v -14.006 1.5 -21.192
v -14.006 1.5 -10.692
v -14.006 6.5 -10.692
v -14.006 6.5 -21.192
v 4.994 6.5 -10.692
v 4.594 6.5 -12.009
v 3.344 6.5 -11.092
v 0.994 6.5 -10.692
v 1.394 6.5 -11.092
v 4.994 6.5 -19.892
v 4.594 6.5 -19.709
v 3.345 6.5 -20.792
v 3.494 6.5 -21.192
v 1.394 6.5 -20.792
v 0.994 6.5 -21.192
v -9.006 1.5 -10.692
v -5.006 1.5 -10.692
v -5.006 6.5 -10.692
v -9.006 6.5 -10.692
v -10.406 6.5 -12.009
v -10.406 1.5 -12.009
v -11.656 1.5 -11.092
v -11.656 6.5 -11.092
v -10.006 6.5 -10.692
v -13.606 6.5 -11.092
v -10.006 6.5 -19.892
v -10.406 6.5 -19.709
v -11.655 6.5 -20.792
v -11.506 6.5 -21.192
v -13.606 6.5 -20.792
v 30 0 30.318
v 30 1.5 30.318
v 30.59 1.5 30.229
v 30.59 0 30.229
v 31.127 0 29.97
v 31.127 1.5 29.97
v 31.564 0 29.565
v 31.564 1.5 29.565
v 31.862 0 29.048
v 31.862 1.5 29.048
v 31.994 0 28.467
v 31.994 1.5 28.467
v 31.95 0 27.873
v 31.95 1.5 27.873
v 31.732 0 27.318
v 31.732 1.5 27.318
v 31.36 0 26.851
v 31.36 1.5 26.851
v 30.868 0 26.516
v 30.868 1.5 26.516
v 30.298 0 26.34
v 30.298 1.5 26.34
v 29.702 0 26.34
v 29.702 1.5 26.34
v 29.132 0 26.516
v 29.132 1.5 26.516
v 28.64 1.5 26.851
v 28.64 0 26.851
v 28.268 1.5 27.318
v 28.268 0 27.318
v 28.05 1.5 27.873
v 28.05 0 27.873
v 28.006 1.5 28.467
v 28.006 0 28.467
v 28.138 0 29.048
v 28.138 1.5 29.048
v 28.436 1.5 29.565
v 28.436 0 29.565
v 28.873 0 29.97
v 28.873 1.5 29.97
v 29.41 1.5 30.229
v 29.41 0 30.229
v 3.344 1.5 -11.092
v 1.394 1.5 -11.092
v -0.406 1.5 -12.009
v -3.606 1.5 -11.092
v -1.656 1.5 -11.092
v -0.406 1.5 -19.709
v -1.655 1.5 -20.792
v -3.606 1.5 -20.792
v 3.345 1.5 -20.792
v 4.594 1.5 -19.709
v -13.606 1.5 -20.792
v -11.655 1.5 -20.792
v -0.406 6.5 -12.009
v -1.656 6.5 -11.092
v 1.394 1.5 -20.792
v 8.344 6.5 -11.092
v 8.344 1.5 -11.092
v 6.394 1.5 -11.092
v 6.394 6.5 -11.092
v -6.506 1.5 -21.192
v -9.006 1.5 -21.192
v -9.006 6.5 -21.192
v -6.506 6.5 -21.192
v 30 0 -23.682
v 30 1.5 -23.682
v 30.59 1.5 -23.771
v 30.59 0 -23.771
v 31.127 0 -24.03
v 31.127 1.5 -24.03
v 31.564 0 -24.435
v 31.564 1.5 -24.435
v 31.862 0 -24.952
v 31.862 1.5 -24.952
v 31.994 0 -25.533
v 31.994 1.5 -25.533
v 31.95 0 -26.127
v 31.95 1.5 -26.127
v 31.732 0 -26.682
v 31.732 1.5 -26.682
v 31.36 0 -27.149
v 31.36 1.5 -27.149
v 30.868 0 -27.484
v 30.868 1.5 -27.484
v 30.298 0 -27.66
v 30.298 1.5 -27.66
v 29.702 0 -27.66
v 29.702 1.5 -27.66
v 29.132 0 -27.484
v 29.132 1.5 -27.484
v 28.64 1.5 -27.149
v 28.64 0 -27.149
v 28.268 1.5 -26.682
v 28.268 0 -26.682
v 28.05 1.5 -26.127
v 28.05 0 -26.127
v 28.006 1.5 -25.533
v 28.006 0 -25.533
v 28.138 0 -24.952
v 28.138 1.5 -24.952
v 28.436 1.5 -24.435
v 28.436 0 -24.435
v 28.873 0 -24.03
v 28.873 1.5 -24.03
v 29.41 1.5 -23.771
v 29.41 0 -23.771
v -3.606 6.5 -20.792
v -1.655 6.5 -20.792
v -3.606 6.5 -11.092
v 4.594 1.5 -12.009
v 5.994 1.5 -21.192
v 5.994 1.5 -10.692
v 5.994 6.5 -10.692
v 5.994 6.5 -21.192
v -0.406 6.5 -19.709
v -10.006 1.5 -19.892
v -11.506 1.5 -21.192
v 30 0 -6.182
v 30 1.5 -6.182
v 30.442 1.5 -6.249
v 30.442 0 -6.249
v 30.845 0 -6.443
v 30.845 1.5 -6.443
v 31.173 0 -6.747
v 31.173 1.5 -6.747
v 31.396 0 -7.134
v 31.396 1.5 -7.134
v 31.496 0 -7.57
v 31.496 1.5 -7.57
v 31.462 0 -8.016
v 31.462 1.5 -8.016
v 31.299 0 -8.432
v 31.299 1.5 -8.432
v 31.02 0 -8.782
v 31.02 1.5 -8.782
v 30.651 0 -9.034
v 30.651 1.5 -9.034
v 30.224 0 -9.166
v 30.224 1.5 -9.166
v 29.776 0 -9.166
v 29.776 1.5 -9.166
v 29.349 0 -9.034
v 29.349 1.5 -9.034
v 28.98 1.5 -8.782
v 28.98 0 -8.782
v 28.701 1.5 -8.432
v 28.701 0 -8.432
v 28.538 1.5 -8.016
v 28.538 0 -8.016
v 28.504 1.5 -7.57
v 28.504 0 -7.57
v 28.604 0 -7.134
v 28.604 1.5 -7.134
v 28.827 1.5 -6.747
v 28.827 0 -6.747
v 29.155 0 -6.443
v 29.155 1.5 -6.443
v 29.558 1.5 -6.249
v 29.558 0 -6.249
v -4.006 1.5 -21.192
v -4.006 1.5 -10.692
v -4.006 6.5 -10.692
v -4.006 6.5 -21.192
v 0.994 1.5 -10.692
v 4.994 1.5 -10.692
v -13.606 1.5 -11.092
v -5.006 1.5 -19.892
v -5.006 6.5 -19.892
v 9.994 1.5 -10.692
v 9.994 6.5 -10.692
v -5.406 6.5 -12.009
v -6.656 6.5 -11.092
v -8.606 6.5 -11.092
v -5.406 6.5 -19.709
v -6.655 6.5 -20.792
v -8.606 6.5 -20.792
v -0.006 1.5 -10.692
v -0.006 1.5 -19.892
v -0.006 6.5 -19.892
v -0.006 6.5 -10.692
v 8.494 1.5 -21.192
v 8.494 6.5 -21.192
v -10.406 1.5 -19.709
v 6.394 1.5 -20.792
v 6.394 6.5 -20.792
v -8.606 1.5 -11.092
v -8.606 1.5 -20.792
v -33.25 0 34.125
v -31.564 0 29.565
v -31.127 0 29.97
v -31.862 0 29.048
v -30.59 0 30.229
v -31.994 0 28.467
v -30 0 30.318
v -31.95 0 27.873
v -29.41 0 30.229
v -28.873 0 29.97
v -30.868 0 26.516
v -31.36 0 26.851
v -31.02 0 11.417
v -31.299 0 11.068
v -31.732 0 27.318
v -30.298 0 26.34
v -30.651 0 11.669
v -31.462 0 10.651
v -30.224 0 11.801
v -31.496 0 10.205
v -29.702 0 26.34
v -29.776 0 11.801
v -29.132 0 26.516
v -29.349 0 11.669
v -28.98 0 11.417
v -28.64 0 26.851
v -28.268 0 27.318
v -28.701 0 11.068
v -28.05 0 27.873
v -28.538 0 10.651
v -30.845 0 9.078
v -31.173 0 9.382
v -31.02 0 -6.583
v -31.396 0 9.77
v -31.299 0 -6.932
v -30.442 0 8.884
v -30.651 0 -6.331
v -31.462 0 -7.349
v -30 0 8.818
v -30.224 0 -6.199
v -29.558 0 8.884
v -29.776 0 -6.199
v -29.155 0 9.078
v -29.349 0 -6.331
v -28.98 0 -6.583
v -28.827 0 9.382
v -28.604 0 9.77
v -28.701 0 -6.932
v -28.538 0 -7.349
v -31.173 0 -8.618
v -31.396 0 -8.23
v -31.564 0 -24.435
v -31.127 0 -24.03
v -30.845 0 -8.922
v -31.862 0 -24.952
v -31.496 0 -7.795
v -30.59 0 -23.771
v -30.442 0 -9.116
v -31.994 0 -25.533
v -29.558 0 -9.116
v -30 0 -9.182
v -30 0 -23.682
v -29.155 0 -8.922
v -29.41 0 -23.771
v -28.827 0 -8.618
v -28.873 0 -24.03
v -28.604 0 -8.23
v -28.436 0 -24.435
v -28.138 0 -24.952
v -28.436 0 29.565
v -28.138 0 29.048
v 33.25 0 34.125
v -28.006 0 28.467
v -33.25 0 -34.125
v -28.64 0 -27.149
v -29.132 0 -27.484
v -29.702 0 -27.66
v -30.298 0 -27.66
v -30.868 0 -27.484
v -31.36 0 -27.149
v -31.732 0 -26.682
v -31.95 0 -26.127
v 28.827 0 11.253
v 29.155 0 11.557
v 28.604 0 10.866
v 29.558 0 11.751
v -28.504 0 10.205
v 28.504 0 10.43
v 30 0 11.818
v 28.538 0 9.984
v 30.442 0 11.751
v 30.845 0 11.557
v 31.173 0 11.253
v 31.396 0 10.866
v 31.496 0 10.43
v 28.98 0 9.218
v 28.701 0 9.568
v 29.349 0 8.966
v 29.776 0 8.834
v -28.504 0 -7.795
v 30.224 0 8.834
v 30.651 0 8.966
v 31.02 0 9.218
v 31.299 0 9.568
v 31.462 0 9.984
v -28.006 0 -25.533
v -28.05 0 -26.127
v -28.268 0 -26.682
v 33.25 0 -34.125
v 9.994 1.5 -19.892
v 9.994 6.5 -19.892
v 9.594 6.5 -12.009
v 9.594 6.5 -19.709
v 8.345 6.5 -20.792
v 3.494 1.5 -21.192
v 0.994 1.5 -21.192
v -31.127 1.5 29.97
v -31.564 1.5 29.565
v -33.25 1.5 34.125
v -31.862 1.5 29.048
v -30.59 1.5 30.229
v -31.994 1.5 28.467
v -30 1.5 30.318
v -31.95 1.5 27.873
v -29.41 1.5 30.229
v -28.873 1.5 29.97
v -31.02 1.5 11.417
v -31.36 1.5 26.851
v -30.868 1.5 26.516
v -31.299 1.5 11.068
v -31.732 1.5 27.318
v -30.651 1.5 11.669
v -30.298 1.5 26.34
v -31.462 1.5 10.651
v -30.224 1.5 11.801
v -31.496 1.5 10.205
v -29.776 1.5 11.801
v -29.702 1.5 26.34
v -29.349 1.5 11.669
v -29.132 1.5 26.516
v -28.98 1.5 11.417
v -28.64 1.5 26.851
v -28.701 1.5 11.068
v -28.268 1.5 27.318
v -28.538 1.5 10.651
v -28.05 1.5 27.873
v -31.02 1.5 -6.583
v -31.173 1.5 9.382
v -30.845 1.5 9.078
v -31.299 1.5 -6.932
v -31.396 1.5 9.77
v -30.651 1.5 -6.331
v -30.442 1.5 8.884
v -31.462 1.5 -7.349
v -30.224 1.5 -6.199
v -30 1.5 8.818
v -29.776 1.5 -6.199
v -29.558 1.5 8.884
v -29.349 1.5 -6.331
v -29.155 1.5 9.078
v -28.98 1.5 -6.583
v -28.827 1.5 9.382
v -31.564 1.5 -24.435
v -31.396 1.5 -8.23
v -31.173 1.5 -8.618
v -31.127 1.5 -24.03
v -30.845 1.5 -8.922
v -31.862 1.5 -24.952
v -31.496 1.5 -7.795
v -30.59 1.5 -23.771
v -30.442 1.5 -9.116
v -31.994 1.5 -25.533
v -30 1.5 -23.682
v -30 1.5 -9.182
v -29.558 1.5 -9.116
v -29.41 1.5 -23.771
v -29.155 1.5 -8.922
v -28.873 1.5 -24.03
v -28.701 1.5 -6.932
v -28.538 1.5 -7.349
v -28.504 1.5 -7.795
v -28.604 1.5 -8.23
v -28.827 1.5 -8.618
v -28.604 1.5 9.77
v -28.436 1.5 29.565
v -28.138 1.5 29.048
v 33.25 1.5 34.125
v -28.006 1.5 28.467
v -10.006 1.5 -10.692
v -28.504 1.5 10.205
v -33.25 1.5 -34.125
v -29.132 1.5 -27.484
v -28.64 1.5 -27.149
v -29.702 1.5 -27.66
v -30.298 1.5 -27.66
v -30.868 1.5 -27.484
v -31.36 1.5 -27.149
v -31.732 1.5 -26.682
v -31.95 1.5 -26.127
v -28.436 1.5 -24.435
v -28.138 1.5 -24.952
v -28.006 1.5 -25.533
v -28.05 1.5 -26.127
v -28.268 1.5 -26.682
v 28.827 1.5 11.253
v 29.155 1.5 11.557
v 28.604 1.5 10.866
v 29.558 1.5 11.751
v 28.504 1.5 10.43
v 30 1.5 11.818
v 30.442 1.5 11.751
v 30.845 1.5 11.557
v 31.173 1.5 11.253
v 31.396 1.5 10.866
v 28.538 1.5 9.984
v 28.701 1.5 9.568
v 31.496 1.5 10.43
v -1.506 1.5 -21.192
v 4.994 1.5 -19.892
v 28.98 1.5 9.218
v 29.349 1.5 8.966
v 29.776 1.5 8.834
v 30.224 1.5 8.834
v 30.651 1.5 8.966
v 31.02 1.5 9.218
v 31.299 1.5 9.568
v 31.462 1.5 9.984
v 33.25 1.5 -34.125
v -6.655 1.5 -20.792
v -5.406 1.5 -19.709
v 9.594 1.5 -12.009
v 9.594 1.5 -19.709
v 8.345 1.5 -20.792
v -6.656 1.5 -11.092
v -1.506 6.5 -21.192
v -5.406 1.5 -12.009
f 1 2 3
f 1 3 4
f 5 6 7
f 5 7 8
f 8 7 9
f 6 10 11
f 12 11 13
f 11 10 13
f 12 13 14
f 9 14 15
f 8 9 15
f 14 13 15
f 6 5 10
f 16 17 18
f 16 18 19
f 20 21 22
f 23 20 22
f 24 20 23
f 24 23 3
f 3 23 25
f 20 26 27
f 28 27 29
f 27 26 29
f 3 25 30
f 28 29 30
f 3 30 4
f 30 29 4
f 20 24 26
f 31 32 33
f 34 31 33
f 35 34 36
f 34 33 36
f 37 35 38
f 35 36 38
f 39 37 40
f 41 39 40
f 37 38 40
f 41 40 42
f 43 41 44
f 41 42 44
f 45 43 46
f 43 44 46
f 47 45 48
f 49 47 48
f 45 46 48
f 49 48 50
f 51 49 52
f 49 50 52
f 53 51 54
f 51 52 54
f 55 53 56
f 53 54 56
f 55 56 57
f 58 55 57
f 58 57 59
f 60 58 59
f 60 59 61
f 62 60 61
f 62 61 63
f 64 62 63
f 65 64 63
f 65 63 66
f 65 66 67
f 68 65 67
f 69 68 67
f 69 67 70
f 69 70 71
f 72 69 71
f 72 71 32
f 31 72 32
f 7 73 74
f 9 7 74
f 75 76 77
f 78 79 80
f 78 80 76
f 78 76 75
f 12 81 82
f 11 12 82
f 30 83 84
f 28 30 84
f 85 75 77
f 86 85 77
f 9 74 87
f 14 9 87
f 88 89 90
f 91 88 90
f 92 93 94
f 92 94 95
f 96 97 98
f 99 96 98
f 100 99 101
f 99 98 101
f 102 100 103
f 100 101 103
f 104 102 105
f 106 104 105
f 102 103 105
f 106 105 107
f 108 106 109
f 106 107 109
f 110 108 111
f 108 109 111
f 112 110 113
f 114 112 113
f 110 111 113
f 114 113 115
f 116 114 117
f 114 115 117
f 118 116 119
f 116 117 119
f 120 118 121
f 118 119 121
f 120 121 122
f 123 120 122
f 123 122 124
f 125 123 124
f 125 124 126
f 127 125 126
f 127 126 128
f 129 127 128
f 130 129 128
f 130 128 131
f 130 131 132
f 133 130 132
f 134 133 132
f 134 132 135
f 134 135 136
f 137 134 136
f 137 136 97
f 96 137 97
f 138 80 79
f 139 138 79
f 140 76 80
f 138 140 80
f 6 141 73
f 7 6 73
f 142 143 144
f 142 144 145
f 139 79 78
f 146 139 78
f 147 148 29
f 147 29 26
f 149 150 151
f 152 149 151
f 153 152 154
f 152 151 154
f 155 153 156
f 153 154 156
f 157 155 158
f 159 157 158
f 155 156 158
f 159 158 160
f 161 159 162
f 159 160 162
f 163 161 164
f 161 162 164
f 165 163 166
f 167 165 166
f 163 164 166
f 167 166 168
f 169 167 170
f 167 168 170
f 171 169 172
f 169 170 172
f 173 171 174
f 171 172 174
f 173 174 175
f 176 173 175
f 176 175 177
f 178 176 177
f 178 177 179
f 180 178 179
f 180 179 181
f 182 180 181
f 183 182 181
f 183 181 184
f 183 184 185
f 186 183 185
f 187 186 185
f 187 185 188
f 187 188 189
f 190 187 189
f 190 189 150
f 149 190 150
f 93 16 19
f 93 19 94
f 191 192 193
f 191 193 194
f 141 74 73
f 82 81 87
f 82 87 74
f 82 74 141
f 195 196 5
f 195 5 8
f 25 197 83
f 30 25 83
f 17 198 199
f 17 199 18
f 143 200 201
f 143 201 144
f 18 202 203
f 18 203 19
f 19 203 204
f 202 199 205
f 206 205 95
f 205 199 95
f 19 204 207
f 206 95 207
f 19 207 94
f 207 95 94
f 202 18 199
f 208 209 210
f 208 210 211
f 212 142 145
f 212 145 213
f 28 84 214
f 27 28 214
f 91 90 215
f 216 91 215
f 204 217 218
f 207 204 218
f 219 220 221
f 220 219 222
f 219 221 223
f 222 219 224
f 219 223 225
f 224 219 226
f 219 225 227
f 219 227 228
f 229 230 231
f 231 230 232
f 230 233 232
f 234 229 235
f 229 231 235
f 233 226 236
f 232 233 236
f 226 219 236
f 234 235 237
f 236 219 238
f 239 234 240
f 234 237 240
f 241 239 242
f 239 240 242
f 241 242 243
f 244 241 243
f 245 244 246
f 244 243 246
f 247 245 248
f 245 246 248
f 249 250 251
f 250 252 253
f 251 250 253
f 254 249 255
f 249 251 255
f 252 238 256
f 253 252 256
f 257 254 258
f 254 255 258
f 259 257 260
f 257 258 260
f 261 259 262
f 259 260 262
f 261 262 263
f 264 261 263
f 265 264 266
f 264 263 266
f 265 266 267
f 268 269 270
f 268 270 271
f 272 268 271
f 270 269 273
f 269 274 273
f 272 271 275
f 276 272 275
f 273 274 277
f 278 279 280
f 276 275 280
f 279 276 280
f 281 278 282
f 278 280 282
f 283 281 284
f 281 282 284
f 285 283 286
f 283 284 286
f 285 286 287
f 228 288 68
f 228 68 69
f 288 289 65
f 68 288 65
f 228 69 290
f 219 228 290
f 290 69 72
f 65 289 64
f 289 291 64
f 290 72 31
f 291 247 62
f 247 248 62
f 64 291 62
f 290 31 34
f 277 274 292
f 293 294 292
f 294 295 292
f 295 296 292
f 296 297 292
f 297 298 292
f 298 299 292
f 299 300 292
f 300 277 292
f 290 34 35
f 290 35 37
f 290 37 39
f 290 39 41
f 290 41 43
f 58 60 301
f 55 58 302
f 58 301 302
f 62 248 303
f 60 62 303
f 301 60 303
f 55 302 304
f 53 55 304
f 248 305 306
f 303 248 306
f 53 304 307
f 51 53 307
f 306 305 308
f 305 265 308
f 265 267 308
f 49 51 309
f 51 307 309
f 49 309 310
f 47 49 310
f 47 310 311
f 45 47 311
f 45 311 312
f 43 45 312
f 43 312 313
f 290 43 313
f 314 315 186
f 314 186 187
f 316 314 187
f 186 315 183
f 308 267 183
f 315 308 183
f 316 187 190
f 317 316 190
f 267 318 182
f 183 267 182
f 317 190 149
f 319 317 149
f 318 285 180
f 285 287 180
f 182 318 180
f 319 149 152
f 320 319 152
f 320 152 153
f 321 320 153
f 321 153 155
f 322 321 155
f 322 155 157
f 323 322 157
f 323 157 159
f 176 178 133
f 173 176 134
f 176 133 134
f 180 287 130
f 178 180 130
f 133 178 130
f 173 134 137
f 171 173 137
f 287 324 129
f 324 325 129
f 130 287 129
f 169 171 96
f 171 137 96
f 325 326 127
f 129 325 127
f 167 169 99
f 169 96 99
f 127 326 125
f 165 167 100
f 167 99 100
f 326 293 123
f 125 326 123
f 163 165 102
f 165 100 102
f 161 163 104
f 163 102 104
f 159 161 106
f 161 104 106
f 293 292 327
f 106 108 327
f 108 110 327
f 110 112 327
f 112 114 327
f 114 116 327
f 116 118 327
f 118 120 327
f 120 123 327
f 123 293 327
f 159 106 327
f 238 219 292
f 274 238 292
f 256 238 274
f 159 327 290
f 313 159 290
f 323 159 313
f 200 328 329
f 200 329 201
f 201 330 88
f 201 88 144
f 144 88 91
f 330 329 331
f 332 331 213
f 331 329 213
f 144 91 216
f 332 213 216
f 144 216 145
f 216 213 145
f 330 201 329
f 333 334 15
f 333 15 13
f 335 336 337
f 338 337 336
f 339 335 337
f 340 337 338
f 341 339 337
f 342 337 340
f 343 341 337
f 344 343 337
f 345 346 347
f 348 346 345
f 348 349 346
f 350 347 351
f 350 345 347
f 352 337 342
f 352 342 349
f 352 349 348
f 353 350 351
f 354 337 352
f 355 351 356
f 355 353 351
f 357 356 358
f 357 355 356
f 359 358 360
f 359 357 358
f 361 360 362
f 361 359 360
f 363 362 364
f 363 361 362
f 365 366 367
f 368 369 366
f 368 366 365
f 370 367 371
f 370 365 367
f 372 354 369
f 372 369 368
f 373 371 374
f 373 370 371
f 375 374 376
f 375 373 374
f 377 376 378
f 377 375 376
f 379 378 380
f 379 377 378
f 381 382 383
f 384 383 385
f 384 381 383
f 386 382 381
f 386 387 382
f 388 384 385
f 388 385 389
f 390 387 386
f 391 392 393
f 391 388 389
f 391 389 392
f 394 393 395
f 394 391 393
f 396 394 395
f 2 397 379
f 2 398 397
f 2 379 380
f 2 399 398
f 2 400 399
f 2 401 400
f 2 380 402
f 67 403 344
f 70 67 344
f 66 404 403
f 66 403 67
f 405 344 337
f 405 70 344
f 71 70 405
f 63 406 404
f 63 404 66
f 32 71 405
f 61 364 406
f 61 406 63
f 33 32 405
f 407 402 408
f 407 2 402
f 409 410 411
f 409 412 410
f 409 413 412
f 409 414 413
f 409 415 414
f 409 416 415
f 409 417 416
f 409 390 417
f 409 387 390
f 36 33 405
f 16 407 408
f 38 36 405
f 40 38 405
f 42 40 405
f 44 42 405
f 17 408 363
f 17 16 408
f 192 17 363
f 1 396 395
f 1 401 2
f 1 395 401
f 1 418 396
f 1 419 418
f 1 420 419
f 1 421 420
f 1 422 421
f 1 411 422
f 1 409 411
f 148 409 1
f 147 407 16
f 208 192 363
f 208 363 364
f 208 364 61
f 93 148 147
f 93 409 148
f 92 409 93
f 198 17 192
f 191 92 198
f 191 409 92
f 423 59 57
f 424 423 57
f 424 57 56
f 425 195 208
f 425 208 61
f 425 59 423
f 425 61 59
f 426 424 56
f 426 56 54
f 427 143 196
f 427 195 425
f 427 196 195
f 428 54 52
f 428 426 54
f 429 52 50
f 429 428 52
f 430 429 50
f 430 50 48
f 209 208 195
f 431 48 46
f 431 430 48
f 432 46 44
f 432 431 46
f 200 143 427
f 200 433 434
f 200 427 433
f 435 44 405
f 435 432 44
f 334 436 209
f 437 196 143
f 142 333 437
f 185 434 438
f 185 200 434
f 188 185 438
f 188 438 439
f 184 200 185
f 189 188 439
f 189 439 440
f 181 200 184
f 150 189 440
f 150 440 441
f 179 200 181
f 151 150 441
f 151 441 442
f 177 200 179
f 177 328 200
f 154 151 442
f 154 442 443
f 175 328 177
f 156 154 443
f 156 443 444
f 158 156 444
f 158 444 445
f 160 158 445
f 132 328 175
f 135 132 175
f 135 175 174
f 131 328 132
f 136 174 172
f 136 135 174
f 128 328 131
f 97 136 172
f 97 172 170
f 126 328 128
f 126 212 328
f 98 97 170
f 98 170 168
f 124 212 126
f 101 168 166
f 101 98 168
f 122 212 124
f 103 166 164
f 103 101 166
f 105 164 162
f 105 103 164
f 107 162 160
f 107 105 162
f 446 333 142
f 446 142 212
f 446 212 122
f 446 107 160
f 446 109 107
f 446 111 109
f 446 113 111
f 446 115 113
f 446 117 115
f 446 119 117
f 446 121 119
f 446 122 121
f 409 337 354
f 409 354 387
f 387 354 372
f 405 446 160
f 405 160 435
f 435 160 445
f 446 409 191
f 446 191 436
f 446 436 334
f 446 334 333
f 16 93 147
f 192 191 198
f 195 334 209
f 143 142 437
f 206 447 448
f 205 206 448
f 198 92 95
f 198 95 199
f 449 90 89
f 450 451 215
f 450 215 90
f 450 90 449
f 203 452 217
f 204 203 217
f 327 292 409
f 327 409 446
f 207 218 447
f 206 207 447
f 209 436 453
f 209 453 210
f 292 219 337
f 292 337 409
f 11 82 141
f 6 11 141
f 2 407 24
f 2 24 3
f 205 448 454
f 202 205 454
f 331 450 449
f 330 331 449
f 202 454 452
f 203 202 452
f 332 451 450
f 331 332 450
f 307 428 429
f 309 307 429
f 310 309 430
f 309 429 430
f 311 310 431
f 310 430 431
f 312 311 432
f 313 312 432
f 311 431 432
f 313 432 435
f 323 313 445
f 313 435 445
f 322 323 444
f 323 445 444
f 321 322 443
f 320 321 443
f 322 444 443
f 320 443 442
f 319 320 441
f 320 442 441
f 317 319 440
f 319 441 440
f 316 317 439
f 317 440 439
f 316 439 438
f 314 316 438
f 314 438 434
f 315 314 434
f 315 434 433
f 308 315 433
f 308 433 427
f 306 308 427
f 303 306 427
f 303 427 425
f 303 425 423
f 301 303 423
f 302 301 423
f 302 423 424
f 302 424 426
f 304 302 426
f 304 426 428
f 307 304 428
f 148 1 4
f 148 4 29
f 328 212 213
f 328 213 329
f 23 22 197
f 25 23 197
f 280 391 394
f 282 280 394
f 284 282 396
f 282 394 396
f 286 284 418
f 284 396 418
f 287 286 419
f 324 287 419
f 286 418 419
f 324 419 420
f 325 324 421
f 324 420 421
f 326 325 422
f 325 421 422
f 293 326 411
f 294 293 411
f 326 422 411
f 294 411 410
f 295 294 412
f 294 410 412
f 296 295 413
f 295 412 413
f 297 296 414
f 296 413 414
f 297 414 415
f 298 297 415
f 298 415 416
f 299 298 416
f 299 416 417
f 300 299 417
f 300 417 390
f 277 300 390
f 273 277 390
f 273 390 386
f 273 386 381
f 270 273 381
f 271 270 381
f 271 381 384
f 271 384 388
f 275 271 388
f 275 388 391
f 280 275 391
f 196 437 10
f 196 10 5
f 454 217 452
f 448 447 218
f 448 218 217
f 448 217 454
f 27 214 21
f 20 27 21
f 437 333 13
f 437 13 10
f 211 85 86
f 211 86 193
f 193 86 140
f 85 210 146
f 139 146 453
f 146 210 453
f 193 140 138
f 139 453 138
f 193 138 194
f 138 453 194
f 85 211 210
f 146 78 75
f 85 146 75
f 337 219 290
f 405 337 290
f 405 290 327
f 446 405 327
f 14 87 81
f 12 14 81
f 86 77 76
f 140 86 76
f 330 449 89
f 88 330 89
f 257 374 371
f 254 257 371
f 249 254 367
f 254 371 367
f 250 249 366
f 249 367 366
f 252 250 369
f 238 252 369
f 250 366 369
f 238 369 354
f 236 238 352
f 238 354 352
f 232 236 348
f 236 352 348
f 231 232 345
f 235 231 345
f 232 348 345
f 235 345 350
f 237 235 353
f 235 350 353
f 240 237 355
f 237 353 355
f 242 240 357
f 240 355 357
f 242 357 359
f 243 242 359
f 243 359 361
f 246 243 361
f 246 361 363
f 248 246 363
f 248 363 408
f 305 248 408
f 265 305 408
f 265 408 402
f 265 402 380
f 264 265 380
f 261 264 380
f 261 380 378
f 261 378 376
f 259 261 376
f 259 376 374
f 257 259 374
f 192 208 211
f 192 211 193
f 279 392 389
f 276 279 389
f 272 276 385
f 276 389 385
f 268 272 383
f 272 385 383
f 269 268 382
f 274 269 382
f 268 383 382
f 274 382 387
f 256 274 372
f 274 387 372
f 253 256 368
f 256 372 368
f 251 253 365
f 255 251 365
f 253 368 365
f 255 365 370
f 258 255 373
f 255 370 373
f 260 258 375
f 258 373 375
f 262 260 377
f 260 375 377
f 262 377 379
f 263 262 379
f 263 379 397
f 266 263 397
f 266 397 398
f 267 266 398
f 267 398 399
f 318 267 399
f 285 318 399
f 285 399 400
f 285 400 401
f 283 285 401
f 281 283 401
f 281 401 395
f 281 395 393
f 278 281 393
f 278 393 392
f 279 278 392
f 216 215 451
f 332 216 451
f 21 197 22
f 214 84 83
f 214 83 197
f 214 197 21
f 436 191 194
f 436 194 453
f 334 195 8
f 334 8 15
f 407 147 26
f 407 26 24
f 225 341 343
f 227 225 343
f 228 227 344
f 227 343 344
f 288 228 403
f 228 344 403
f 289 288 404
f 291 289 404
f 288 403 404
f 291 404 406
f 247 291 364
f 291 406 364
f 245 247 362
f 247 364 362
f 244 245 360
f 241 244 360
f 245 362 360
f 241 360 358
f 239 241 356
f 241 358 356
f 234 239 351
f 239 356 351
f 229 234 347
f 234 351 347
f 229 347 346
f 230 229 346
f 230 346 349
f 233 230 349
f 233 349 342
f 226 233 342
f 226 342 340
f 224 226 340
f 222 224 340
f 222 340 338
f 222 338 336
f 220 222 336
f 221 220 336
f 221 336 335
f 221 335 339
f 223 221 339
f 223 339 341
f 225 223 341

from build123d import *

# Parameters (mm, degrees)
SKETCH1_W           = 66.5
SKETCH1_H           = 68.25
BOSS_EXTRUDE1_DEPTH = 1.5
SKETCH3_R           = 2
SKETCH3_R_2         = 1.5
CUT_EXTRUDE1_DEPTH  = 48.668942982
BOSS_EXTRUDE2_DEPTH = 5


with BuildPart() as part:
    # Sketch1 → Boss-Extrude1 (new body)
    with BuildSketch(Plane(origin=(0, 0, 0), x_dir=(1, 0, 0), z_dir=(0, 1, 0))):
        Rectangle(SKETCH1_W, SKETCH1_H)
    extrude(amount=BOSS_EXTRUDE1_DEPTH)

    # Sketch3 → Cut-Extrude1 (cut, through all)
    with BuildSketch(Plane(origin=(0, 1.5, 0), x_dir=(1, 0, 0), z_dir=(0, 1, 0))):
        with Locations(Location((-30, -28.317585536, 0), (0, 0, 270))):
            Circle(SKETCH3_R)
        with Locations(Location((30, -28.317585536, 0), (0, 0, 270))):
            Circle(SKETCH3_R)
        with Locations(Location((30, 25.682414464, 0), (0, 0, 270))):
            Circle(SKETCH3_R)
        with Locations(Location((-30, 25.682414464, 0), (0, 0, 270))):
            Circle(SKETCH3_R)
        with Locations(Location((30, 7.682414464, 0), (0, 0, 270))):
            Circle(SKETCH3_R_2)
        with Locations(Location((30, -10.317585536, 0), (0, 0, 270))):
            Circle(SKETCH3_R_2)
        with Locations(Location((-30, -10.317585536, 0), (0, 0, 90))):
            Circle(SKETCH3_R_2)
        with Locations(Location((-30, 7.682414464, 0), (0, 0, 90))):
            Circle(SKETCH3_R_2)
    extrude(amount=-CUT_EXTRUDE1_DEPTH, mode=Mode.SUBTRACT)

    # Sketch5 → Boss-Extrude2 (add)
    # profile 1 of 5: a face of its own
    with BuildSketch(Plane(origin=(0, 1.5, 0), x_dir=(1, 0, 0), z_dir=(0, 1, 0))):
        Polygon((-14.006270714, 21.19159661), (-11.506270714, 21.19159661), (-10.006270714, 19.89159661), (-10.006270714, 10.69159661), (-14.006270714, 10.69159661), align=None)
        Polygon((-10.406270714, 19.708945057), (-10.406270714, 12.008945057), (-11.656270714, 11.09159661), (-13.606270714, 11.09159661), (-13.606270714, 20.79159661), (-11.655484044, 20.79159661), align=None, mode=Mode.SUBTRACT)
    # profile 2 of 5: a face of its own
    with BuildSketch(Plane(origin=(0, 1.5, 0), x_dir=(1, 0, 0), z_dir=(0, 1, 0))):
        Polygon((-9.006270714, 21.19159661), (-6.506270714, 21.19159661), (-5.006270714, 19.89159661), (-5.006270714, 10.69159661), (-9.006270714, 10.69159661), align=None)
        Polygon((-5.406270714, 19.708945057), (-5.406270714, 12.008945057), (-6.656270714, 11.09159661), (-8.606270714, 11.09159661), (-8.606270714, 20.79159661), (-6.655484044, 20.79159661), align=None, mode=Mode.SUBTRACT)
    # profile 3 of 5: a face of its own
    with BuildSketch(Plane(origin=(0, 1.5, 0), x_dir=(1, 0, 0), z_dir=(0, 1, 0))):
        Polygon((-4.006270714, 21.19159661), (-1.506270714, 21.19159661), (-0.006270714, 19.89159661), (-0.006270714, 10.69159661), (-4.006270714, 10.69159661), align=None)
        Polygon((-0.406270714, 19.708945057), (-0.406270714, 12.008945057), (-1.656270714, 11.09159661), (-3.606270714, 11.09159661), (-3.606270714, 20.79159661), (-1.655484044, 20.79159661), align=None, mode=Mode.SUBTRACT)
    # profile 4 of 5: a face of its own
    with BuildSketch(Plane(origin=(0, 1.5, 0), x_dir=(1, 0, 0), z_dir=(0, 1, 0))):
        Polygon((0.993729286, 21.19159661), (3.493729286, 21.19159661), (4.993729286, 19.89159661), (4.993729286, 10.69159661), (0.993729286, 10.69159661), align=None)
        Polygon((4.593729286, 19.708945057), (4.593729286, 12.008945057), (3.343729286, 11.09159661), (1.393729286, 11.09159661), (1.393729286, 20.79159661), (3.344515956, 20.79159661), align=None, mode=Mode.SUBTRACT)
    # profile 5 of 5: a face of its own
    with BuildSketch(Plane(origin=(0, 1.5, 0), x_dir=(1, 0, 0), z_dir=(0, 1, 0))):
        Polygon((5.993729286, 21.19159661), (8.493729286, 21.19159661), (9.993729286, 19.89159661), (9.993729286, 10.69159661), (5.993729286, 10.69159661), align=None)
        Polygon((9.593729286, 19.708945057), (9.593729286, 12.008945057), (8.343729286, 11.09159661), (6.393729286, 11.09159661), (6.393729286, 20.79159661), (8.344515956, 20.79159661), align=None, mode=Mode.SUBTRACT)
    extrude(amount=BOSS_EXTRUDE2_DEPTH)


solid = part.part
